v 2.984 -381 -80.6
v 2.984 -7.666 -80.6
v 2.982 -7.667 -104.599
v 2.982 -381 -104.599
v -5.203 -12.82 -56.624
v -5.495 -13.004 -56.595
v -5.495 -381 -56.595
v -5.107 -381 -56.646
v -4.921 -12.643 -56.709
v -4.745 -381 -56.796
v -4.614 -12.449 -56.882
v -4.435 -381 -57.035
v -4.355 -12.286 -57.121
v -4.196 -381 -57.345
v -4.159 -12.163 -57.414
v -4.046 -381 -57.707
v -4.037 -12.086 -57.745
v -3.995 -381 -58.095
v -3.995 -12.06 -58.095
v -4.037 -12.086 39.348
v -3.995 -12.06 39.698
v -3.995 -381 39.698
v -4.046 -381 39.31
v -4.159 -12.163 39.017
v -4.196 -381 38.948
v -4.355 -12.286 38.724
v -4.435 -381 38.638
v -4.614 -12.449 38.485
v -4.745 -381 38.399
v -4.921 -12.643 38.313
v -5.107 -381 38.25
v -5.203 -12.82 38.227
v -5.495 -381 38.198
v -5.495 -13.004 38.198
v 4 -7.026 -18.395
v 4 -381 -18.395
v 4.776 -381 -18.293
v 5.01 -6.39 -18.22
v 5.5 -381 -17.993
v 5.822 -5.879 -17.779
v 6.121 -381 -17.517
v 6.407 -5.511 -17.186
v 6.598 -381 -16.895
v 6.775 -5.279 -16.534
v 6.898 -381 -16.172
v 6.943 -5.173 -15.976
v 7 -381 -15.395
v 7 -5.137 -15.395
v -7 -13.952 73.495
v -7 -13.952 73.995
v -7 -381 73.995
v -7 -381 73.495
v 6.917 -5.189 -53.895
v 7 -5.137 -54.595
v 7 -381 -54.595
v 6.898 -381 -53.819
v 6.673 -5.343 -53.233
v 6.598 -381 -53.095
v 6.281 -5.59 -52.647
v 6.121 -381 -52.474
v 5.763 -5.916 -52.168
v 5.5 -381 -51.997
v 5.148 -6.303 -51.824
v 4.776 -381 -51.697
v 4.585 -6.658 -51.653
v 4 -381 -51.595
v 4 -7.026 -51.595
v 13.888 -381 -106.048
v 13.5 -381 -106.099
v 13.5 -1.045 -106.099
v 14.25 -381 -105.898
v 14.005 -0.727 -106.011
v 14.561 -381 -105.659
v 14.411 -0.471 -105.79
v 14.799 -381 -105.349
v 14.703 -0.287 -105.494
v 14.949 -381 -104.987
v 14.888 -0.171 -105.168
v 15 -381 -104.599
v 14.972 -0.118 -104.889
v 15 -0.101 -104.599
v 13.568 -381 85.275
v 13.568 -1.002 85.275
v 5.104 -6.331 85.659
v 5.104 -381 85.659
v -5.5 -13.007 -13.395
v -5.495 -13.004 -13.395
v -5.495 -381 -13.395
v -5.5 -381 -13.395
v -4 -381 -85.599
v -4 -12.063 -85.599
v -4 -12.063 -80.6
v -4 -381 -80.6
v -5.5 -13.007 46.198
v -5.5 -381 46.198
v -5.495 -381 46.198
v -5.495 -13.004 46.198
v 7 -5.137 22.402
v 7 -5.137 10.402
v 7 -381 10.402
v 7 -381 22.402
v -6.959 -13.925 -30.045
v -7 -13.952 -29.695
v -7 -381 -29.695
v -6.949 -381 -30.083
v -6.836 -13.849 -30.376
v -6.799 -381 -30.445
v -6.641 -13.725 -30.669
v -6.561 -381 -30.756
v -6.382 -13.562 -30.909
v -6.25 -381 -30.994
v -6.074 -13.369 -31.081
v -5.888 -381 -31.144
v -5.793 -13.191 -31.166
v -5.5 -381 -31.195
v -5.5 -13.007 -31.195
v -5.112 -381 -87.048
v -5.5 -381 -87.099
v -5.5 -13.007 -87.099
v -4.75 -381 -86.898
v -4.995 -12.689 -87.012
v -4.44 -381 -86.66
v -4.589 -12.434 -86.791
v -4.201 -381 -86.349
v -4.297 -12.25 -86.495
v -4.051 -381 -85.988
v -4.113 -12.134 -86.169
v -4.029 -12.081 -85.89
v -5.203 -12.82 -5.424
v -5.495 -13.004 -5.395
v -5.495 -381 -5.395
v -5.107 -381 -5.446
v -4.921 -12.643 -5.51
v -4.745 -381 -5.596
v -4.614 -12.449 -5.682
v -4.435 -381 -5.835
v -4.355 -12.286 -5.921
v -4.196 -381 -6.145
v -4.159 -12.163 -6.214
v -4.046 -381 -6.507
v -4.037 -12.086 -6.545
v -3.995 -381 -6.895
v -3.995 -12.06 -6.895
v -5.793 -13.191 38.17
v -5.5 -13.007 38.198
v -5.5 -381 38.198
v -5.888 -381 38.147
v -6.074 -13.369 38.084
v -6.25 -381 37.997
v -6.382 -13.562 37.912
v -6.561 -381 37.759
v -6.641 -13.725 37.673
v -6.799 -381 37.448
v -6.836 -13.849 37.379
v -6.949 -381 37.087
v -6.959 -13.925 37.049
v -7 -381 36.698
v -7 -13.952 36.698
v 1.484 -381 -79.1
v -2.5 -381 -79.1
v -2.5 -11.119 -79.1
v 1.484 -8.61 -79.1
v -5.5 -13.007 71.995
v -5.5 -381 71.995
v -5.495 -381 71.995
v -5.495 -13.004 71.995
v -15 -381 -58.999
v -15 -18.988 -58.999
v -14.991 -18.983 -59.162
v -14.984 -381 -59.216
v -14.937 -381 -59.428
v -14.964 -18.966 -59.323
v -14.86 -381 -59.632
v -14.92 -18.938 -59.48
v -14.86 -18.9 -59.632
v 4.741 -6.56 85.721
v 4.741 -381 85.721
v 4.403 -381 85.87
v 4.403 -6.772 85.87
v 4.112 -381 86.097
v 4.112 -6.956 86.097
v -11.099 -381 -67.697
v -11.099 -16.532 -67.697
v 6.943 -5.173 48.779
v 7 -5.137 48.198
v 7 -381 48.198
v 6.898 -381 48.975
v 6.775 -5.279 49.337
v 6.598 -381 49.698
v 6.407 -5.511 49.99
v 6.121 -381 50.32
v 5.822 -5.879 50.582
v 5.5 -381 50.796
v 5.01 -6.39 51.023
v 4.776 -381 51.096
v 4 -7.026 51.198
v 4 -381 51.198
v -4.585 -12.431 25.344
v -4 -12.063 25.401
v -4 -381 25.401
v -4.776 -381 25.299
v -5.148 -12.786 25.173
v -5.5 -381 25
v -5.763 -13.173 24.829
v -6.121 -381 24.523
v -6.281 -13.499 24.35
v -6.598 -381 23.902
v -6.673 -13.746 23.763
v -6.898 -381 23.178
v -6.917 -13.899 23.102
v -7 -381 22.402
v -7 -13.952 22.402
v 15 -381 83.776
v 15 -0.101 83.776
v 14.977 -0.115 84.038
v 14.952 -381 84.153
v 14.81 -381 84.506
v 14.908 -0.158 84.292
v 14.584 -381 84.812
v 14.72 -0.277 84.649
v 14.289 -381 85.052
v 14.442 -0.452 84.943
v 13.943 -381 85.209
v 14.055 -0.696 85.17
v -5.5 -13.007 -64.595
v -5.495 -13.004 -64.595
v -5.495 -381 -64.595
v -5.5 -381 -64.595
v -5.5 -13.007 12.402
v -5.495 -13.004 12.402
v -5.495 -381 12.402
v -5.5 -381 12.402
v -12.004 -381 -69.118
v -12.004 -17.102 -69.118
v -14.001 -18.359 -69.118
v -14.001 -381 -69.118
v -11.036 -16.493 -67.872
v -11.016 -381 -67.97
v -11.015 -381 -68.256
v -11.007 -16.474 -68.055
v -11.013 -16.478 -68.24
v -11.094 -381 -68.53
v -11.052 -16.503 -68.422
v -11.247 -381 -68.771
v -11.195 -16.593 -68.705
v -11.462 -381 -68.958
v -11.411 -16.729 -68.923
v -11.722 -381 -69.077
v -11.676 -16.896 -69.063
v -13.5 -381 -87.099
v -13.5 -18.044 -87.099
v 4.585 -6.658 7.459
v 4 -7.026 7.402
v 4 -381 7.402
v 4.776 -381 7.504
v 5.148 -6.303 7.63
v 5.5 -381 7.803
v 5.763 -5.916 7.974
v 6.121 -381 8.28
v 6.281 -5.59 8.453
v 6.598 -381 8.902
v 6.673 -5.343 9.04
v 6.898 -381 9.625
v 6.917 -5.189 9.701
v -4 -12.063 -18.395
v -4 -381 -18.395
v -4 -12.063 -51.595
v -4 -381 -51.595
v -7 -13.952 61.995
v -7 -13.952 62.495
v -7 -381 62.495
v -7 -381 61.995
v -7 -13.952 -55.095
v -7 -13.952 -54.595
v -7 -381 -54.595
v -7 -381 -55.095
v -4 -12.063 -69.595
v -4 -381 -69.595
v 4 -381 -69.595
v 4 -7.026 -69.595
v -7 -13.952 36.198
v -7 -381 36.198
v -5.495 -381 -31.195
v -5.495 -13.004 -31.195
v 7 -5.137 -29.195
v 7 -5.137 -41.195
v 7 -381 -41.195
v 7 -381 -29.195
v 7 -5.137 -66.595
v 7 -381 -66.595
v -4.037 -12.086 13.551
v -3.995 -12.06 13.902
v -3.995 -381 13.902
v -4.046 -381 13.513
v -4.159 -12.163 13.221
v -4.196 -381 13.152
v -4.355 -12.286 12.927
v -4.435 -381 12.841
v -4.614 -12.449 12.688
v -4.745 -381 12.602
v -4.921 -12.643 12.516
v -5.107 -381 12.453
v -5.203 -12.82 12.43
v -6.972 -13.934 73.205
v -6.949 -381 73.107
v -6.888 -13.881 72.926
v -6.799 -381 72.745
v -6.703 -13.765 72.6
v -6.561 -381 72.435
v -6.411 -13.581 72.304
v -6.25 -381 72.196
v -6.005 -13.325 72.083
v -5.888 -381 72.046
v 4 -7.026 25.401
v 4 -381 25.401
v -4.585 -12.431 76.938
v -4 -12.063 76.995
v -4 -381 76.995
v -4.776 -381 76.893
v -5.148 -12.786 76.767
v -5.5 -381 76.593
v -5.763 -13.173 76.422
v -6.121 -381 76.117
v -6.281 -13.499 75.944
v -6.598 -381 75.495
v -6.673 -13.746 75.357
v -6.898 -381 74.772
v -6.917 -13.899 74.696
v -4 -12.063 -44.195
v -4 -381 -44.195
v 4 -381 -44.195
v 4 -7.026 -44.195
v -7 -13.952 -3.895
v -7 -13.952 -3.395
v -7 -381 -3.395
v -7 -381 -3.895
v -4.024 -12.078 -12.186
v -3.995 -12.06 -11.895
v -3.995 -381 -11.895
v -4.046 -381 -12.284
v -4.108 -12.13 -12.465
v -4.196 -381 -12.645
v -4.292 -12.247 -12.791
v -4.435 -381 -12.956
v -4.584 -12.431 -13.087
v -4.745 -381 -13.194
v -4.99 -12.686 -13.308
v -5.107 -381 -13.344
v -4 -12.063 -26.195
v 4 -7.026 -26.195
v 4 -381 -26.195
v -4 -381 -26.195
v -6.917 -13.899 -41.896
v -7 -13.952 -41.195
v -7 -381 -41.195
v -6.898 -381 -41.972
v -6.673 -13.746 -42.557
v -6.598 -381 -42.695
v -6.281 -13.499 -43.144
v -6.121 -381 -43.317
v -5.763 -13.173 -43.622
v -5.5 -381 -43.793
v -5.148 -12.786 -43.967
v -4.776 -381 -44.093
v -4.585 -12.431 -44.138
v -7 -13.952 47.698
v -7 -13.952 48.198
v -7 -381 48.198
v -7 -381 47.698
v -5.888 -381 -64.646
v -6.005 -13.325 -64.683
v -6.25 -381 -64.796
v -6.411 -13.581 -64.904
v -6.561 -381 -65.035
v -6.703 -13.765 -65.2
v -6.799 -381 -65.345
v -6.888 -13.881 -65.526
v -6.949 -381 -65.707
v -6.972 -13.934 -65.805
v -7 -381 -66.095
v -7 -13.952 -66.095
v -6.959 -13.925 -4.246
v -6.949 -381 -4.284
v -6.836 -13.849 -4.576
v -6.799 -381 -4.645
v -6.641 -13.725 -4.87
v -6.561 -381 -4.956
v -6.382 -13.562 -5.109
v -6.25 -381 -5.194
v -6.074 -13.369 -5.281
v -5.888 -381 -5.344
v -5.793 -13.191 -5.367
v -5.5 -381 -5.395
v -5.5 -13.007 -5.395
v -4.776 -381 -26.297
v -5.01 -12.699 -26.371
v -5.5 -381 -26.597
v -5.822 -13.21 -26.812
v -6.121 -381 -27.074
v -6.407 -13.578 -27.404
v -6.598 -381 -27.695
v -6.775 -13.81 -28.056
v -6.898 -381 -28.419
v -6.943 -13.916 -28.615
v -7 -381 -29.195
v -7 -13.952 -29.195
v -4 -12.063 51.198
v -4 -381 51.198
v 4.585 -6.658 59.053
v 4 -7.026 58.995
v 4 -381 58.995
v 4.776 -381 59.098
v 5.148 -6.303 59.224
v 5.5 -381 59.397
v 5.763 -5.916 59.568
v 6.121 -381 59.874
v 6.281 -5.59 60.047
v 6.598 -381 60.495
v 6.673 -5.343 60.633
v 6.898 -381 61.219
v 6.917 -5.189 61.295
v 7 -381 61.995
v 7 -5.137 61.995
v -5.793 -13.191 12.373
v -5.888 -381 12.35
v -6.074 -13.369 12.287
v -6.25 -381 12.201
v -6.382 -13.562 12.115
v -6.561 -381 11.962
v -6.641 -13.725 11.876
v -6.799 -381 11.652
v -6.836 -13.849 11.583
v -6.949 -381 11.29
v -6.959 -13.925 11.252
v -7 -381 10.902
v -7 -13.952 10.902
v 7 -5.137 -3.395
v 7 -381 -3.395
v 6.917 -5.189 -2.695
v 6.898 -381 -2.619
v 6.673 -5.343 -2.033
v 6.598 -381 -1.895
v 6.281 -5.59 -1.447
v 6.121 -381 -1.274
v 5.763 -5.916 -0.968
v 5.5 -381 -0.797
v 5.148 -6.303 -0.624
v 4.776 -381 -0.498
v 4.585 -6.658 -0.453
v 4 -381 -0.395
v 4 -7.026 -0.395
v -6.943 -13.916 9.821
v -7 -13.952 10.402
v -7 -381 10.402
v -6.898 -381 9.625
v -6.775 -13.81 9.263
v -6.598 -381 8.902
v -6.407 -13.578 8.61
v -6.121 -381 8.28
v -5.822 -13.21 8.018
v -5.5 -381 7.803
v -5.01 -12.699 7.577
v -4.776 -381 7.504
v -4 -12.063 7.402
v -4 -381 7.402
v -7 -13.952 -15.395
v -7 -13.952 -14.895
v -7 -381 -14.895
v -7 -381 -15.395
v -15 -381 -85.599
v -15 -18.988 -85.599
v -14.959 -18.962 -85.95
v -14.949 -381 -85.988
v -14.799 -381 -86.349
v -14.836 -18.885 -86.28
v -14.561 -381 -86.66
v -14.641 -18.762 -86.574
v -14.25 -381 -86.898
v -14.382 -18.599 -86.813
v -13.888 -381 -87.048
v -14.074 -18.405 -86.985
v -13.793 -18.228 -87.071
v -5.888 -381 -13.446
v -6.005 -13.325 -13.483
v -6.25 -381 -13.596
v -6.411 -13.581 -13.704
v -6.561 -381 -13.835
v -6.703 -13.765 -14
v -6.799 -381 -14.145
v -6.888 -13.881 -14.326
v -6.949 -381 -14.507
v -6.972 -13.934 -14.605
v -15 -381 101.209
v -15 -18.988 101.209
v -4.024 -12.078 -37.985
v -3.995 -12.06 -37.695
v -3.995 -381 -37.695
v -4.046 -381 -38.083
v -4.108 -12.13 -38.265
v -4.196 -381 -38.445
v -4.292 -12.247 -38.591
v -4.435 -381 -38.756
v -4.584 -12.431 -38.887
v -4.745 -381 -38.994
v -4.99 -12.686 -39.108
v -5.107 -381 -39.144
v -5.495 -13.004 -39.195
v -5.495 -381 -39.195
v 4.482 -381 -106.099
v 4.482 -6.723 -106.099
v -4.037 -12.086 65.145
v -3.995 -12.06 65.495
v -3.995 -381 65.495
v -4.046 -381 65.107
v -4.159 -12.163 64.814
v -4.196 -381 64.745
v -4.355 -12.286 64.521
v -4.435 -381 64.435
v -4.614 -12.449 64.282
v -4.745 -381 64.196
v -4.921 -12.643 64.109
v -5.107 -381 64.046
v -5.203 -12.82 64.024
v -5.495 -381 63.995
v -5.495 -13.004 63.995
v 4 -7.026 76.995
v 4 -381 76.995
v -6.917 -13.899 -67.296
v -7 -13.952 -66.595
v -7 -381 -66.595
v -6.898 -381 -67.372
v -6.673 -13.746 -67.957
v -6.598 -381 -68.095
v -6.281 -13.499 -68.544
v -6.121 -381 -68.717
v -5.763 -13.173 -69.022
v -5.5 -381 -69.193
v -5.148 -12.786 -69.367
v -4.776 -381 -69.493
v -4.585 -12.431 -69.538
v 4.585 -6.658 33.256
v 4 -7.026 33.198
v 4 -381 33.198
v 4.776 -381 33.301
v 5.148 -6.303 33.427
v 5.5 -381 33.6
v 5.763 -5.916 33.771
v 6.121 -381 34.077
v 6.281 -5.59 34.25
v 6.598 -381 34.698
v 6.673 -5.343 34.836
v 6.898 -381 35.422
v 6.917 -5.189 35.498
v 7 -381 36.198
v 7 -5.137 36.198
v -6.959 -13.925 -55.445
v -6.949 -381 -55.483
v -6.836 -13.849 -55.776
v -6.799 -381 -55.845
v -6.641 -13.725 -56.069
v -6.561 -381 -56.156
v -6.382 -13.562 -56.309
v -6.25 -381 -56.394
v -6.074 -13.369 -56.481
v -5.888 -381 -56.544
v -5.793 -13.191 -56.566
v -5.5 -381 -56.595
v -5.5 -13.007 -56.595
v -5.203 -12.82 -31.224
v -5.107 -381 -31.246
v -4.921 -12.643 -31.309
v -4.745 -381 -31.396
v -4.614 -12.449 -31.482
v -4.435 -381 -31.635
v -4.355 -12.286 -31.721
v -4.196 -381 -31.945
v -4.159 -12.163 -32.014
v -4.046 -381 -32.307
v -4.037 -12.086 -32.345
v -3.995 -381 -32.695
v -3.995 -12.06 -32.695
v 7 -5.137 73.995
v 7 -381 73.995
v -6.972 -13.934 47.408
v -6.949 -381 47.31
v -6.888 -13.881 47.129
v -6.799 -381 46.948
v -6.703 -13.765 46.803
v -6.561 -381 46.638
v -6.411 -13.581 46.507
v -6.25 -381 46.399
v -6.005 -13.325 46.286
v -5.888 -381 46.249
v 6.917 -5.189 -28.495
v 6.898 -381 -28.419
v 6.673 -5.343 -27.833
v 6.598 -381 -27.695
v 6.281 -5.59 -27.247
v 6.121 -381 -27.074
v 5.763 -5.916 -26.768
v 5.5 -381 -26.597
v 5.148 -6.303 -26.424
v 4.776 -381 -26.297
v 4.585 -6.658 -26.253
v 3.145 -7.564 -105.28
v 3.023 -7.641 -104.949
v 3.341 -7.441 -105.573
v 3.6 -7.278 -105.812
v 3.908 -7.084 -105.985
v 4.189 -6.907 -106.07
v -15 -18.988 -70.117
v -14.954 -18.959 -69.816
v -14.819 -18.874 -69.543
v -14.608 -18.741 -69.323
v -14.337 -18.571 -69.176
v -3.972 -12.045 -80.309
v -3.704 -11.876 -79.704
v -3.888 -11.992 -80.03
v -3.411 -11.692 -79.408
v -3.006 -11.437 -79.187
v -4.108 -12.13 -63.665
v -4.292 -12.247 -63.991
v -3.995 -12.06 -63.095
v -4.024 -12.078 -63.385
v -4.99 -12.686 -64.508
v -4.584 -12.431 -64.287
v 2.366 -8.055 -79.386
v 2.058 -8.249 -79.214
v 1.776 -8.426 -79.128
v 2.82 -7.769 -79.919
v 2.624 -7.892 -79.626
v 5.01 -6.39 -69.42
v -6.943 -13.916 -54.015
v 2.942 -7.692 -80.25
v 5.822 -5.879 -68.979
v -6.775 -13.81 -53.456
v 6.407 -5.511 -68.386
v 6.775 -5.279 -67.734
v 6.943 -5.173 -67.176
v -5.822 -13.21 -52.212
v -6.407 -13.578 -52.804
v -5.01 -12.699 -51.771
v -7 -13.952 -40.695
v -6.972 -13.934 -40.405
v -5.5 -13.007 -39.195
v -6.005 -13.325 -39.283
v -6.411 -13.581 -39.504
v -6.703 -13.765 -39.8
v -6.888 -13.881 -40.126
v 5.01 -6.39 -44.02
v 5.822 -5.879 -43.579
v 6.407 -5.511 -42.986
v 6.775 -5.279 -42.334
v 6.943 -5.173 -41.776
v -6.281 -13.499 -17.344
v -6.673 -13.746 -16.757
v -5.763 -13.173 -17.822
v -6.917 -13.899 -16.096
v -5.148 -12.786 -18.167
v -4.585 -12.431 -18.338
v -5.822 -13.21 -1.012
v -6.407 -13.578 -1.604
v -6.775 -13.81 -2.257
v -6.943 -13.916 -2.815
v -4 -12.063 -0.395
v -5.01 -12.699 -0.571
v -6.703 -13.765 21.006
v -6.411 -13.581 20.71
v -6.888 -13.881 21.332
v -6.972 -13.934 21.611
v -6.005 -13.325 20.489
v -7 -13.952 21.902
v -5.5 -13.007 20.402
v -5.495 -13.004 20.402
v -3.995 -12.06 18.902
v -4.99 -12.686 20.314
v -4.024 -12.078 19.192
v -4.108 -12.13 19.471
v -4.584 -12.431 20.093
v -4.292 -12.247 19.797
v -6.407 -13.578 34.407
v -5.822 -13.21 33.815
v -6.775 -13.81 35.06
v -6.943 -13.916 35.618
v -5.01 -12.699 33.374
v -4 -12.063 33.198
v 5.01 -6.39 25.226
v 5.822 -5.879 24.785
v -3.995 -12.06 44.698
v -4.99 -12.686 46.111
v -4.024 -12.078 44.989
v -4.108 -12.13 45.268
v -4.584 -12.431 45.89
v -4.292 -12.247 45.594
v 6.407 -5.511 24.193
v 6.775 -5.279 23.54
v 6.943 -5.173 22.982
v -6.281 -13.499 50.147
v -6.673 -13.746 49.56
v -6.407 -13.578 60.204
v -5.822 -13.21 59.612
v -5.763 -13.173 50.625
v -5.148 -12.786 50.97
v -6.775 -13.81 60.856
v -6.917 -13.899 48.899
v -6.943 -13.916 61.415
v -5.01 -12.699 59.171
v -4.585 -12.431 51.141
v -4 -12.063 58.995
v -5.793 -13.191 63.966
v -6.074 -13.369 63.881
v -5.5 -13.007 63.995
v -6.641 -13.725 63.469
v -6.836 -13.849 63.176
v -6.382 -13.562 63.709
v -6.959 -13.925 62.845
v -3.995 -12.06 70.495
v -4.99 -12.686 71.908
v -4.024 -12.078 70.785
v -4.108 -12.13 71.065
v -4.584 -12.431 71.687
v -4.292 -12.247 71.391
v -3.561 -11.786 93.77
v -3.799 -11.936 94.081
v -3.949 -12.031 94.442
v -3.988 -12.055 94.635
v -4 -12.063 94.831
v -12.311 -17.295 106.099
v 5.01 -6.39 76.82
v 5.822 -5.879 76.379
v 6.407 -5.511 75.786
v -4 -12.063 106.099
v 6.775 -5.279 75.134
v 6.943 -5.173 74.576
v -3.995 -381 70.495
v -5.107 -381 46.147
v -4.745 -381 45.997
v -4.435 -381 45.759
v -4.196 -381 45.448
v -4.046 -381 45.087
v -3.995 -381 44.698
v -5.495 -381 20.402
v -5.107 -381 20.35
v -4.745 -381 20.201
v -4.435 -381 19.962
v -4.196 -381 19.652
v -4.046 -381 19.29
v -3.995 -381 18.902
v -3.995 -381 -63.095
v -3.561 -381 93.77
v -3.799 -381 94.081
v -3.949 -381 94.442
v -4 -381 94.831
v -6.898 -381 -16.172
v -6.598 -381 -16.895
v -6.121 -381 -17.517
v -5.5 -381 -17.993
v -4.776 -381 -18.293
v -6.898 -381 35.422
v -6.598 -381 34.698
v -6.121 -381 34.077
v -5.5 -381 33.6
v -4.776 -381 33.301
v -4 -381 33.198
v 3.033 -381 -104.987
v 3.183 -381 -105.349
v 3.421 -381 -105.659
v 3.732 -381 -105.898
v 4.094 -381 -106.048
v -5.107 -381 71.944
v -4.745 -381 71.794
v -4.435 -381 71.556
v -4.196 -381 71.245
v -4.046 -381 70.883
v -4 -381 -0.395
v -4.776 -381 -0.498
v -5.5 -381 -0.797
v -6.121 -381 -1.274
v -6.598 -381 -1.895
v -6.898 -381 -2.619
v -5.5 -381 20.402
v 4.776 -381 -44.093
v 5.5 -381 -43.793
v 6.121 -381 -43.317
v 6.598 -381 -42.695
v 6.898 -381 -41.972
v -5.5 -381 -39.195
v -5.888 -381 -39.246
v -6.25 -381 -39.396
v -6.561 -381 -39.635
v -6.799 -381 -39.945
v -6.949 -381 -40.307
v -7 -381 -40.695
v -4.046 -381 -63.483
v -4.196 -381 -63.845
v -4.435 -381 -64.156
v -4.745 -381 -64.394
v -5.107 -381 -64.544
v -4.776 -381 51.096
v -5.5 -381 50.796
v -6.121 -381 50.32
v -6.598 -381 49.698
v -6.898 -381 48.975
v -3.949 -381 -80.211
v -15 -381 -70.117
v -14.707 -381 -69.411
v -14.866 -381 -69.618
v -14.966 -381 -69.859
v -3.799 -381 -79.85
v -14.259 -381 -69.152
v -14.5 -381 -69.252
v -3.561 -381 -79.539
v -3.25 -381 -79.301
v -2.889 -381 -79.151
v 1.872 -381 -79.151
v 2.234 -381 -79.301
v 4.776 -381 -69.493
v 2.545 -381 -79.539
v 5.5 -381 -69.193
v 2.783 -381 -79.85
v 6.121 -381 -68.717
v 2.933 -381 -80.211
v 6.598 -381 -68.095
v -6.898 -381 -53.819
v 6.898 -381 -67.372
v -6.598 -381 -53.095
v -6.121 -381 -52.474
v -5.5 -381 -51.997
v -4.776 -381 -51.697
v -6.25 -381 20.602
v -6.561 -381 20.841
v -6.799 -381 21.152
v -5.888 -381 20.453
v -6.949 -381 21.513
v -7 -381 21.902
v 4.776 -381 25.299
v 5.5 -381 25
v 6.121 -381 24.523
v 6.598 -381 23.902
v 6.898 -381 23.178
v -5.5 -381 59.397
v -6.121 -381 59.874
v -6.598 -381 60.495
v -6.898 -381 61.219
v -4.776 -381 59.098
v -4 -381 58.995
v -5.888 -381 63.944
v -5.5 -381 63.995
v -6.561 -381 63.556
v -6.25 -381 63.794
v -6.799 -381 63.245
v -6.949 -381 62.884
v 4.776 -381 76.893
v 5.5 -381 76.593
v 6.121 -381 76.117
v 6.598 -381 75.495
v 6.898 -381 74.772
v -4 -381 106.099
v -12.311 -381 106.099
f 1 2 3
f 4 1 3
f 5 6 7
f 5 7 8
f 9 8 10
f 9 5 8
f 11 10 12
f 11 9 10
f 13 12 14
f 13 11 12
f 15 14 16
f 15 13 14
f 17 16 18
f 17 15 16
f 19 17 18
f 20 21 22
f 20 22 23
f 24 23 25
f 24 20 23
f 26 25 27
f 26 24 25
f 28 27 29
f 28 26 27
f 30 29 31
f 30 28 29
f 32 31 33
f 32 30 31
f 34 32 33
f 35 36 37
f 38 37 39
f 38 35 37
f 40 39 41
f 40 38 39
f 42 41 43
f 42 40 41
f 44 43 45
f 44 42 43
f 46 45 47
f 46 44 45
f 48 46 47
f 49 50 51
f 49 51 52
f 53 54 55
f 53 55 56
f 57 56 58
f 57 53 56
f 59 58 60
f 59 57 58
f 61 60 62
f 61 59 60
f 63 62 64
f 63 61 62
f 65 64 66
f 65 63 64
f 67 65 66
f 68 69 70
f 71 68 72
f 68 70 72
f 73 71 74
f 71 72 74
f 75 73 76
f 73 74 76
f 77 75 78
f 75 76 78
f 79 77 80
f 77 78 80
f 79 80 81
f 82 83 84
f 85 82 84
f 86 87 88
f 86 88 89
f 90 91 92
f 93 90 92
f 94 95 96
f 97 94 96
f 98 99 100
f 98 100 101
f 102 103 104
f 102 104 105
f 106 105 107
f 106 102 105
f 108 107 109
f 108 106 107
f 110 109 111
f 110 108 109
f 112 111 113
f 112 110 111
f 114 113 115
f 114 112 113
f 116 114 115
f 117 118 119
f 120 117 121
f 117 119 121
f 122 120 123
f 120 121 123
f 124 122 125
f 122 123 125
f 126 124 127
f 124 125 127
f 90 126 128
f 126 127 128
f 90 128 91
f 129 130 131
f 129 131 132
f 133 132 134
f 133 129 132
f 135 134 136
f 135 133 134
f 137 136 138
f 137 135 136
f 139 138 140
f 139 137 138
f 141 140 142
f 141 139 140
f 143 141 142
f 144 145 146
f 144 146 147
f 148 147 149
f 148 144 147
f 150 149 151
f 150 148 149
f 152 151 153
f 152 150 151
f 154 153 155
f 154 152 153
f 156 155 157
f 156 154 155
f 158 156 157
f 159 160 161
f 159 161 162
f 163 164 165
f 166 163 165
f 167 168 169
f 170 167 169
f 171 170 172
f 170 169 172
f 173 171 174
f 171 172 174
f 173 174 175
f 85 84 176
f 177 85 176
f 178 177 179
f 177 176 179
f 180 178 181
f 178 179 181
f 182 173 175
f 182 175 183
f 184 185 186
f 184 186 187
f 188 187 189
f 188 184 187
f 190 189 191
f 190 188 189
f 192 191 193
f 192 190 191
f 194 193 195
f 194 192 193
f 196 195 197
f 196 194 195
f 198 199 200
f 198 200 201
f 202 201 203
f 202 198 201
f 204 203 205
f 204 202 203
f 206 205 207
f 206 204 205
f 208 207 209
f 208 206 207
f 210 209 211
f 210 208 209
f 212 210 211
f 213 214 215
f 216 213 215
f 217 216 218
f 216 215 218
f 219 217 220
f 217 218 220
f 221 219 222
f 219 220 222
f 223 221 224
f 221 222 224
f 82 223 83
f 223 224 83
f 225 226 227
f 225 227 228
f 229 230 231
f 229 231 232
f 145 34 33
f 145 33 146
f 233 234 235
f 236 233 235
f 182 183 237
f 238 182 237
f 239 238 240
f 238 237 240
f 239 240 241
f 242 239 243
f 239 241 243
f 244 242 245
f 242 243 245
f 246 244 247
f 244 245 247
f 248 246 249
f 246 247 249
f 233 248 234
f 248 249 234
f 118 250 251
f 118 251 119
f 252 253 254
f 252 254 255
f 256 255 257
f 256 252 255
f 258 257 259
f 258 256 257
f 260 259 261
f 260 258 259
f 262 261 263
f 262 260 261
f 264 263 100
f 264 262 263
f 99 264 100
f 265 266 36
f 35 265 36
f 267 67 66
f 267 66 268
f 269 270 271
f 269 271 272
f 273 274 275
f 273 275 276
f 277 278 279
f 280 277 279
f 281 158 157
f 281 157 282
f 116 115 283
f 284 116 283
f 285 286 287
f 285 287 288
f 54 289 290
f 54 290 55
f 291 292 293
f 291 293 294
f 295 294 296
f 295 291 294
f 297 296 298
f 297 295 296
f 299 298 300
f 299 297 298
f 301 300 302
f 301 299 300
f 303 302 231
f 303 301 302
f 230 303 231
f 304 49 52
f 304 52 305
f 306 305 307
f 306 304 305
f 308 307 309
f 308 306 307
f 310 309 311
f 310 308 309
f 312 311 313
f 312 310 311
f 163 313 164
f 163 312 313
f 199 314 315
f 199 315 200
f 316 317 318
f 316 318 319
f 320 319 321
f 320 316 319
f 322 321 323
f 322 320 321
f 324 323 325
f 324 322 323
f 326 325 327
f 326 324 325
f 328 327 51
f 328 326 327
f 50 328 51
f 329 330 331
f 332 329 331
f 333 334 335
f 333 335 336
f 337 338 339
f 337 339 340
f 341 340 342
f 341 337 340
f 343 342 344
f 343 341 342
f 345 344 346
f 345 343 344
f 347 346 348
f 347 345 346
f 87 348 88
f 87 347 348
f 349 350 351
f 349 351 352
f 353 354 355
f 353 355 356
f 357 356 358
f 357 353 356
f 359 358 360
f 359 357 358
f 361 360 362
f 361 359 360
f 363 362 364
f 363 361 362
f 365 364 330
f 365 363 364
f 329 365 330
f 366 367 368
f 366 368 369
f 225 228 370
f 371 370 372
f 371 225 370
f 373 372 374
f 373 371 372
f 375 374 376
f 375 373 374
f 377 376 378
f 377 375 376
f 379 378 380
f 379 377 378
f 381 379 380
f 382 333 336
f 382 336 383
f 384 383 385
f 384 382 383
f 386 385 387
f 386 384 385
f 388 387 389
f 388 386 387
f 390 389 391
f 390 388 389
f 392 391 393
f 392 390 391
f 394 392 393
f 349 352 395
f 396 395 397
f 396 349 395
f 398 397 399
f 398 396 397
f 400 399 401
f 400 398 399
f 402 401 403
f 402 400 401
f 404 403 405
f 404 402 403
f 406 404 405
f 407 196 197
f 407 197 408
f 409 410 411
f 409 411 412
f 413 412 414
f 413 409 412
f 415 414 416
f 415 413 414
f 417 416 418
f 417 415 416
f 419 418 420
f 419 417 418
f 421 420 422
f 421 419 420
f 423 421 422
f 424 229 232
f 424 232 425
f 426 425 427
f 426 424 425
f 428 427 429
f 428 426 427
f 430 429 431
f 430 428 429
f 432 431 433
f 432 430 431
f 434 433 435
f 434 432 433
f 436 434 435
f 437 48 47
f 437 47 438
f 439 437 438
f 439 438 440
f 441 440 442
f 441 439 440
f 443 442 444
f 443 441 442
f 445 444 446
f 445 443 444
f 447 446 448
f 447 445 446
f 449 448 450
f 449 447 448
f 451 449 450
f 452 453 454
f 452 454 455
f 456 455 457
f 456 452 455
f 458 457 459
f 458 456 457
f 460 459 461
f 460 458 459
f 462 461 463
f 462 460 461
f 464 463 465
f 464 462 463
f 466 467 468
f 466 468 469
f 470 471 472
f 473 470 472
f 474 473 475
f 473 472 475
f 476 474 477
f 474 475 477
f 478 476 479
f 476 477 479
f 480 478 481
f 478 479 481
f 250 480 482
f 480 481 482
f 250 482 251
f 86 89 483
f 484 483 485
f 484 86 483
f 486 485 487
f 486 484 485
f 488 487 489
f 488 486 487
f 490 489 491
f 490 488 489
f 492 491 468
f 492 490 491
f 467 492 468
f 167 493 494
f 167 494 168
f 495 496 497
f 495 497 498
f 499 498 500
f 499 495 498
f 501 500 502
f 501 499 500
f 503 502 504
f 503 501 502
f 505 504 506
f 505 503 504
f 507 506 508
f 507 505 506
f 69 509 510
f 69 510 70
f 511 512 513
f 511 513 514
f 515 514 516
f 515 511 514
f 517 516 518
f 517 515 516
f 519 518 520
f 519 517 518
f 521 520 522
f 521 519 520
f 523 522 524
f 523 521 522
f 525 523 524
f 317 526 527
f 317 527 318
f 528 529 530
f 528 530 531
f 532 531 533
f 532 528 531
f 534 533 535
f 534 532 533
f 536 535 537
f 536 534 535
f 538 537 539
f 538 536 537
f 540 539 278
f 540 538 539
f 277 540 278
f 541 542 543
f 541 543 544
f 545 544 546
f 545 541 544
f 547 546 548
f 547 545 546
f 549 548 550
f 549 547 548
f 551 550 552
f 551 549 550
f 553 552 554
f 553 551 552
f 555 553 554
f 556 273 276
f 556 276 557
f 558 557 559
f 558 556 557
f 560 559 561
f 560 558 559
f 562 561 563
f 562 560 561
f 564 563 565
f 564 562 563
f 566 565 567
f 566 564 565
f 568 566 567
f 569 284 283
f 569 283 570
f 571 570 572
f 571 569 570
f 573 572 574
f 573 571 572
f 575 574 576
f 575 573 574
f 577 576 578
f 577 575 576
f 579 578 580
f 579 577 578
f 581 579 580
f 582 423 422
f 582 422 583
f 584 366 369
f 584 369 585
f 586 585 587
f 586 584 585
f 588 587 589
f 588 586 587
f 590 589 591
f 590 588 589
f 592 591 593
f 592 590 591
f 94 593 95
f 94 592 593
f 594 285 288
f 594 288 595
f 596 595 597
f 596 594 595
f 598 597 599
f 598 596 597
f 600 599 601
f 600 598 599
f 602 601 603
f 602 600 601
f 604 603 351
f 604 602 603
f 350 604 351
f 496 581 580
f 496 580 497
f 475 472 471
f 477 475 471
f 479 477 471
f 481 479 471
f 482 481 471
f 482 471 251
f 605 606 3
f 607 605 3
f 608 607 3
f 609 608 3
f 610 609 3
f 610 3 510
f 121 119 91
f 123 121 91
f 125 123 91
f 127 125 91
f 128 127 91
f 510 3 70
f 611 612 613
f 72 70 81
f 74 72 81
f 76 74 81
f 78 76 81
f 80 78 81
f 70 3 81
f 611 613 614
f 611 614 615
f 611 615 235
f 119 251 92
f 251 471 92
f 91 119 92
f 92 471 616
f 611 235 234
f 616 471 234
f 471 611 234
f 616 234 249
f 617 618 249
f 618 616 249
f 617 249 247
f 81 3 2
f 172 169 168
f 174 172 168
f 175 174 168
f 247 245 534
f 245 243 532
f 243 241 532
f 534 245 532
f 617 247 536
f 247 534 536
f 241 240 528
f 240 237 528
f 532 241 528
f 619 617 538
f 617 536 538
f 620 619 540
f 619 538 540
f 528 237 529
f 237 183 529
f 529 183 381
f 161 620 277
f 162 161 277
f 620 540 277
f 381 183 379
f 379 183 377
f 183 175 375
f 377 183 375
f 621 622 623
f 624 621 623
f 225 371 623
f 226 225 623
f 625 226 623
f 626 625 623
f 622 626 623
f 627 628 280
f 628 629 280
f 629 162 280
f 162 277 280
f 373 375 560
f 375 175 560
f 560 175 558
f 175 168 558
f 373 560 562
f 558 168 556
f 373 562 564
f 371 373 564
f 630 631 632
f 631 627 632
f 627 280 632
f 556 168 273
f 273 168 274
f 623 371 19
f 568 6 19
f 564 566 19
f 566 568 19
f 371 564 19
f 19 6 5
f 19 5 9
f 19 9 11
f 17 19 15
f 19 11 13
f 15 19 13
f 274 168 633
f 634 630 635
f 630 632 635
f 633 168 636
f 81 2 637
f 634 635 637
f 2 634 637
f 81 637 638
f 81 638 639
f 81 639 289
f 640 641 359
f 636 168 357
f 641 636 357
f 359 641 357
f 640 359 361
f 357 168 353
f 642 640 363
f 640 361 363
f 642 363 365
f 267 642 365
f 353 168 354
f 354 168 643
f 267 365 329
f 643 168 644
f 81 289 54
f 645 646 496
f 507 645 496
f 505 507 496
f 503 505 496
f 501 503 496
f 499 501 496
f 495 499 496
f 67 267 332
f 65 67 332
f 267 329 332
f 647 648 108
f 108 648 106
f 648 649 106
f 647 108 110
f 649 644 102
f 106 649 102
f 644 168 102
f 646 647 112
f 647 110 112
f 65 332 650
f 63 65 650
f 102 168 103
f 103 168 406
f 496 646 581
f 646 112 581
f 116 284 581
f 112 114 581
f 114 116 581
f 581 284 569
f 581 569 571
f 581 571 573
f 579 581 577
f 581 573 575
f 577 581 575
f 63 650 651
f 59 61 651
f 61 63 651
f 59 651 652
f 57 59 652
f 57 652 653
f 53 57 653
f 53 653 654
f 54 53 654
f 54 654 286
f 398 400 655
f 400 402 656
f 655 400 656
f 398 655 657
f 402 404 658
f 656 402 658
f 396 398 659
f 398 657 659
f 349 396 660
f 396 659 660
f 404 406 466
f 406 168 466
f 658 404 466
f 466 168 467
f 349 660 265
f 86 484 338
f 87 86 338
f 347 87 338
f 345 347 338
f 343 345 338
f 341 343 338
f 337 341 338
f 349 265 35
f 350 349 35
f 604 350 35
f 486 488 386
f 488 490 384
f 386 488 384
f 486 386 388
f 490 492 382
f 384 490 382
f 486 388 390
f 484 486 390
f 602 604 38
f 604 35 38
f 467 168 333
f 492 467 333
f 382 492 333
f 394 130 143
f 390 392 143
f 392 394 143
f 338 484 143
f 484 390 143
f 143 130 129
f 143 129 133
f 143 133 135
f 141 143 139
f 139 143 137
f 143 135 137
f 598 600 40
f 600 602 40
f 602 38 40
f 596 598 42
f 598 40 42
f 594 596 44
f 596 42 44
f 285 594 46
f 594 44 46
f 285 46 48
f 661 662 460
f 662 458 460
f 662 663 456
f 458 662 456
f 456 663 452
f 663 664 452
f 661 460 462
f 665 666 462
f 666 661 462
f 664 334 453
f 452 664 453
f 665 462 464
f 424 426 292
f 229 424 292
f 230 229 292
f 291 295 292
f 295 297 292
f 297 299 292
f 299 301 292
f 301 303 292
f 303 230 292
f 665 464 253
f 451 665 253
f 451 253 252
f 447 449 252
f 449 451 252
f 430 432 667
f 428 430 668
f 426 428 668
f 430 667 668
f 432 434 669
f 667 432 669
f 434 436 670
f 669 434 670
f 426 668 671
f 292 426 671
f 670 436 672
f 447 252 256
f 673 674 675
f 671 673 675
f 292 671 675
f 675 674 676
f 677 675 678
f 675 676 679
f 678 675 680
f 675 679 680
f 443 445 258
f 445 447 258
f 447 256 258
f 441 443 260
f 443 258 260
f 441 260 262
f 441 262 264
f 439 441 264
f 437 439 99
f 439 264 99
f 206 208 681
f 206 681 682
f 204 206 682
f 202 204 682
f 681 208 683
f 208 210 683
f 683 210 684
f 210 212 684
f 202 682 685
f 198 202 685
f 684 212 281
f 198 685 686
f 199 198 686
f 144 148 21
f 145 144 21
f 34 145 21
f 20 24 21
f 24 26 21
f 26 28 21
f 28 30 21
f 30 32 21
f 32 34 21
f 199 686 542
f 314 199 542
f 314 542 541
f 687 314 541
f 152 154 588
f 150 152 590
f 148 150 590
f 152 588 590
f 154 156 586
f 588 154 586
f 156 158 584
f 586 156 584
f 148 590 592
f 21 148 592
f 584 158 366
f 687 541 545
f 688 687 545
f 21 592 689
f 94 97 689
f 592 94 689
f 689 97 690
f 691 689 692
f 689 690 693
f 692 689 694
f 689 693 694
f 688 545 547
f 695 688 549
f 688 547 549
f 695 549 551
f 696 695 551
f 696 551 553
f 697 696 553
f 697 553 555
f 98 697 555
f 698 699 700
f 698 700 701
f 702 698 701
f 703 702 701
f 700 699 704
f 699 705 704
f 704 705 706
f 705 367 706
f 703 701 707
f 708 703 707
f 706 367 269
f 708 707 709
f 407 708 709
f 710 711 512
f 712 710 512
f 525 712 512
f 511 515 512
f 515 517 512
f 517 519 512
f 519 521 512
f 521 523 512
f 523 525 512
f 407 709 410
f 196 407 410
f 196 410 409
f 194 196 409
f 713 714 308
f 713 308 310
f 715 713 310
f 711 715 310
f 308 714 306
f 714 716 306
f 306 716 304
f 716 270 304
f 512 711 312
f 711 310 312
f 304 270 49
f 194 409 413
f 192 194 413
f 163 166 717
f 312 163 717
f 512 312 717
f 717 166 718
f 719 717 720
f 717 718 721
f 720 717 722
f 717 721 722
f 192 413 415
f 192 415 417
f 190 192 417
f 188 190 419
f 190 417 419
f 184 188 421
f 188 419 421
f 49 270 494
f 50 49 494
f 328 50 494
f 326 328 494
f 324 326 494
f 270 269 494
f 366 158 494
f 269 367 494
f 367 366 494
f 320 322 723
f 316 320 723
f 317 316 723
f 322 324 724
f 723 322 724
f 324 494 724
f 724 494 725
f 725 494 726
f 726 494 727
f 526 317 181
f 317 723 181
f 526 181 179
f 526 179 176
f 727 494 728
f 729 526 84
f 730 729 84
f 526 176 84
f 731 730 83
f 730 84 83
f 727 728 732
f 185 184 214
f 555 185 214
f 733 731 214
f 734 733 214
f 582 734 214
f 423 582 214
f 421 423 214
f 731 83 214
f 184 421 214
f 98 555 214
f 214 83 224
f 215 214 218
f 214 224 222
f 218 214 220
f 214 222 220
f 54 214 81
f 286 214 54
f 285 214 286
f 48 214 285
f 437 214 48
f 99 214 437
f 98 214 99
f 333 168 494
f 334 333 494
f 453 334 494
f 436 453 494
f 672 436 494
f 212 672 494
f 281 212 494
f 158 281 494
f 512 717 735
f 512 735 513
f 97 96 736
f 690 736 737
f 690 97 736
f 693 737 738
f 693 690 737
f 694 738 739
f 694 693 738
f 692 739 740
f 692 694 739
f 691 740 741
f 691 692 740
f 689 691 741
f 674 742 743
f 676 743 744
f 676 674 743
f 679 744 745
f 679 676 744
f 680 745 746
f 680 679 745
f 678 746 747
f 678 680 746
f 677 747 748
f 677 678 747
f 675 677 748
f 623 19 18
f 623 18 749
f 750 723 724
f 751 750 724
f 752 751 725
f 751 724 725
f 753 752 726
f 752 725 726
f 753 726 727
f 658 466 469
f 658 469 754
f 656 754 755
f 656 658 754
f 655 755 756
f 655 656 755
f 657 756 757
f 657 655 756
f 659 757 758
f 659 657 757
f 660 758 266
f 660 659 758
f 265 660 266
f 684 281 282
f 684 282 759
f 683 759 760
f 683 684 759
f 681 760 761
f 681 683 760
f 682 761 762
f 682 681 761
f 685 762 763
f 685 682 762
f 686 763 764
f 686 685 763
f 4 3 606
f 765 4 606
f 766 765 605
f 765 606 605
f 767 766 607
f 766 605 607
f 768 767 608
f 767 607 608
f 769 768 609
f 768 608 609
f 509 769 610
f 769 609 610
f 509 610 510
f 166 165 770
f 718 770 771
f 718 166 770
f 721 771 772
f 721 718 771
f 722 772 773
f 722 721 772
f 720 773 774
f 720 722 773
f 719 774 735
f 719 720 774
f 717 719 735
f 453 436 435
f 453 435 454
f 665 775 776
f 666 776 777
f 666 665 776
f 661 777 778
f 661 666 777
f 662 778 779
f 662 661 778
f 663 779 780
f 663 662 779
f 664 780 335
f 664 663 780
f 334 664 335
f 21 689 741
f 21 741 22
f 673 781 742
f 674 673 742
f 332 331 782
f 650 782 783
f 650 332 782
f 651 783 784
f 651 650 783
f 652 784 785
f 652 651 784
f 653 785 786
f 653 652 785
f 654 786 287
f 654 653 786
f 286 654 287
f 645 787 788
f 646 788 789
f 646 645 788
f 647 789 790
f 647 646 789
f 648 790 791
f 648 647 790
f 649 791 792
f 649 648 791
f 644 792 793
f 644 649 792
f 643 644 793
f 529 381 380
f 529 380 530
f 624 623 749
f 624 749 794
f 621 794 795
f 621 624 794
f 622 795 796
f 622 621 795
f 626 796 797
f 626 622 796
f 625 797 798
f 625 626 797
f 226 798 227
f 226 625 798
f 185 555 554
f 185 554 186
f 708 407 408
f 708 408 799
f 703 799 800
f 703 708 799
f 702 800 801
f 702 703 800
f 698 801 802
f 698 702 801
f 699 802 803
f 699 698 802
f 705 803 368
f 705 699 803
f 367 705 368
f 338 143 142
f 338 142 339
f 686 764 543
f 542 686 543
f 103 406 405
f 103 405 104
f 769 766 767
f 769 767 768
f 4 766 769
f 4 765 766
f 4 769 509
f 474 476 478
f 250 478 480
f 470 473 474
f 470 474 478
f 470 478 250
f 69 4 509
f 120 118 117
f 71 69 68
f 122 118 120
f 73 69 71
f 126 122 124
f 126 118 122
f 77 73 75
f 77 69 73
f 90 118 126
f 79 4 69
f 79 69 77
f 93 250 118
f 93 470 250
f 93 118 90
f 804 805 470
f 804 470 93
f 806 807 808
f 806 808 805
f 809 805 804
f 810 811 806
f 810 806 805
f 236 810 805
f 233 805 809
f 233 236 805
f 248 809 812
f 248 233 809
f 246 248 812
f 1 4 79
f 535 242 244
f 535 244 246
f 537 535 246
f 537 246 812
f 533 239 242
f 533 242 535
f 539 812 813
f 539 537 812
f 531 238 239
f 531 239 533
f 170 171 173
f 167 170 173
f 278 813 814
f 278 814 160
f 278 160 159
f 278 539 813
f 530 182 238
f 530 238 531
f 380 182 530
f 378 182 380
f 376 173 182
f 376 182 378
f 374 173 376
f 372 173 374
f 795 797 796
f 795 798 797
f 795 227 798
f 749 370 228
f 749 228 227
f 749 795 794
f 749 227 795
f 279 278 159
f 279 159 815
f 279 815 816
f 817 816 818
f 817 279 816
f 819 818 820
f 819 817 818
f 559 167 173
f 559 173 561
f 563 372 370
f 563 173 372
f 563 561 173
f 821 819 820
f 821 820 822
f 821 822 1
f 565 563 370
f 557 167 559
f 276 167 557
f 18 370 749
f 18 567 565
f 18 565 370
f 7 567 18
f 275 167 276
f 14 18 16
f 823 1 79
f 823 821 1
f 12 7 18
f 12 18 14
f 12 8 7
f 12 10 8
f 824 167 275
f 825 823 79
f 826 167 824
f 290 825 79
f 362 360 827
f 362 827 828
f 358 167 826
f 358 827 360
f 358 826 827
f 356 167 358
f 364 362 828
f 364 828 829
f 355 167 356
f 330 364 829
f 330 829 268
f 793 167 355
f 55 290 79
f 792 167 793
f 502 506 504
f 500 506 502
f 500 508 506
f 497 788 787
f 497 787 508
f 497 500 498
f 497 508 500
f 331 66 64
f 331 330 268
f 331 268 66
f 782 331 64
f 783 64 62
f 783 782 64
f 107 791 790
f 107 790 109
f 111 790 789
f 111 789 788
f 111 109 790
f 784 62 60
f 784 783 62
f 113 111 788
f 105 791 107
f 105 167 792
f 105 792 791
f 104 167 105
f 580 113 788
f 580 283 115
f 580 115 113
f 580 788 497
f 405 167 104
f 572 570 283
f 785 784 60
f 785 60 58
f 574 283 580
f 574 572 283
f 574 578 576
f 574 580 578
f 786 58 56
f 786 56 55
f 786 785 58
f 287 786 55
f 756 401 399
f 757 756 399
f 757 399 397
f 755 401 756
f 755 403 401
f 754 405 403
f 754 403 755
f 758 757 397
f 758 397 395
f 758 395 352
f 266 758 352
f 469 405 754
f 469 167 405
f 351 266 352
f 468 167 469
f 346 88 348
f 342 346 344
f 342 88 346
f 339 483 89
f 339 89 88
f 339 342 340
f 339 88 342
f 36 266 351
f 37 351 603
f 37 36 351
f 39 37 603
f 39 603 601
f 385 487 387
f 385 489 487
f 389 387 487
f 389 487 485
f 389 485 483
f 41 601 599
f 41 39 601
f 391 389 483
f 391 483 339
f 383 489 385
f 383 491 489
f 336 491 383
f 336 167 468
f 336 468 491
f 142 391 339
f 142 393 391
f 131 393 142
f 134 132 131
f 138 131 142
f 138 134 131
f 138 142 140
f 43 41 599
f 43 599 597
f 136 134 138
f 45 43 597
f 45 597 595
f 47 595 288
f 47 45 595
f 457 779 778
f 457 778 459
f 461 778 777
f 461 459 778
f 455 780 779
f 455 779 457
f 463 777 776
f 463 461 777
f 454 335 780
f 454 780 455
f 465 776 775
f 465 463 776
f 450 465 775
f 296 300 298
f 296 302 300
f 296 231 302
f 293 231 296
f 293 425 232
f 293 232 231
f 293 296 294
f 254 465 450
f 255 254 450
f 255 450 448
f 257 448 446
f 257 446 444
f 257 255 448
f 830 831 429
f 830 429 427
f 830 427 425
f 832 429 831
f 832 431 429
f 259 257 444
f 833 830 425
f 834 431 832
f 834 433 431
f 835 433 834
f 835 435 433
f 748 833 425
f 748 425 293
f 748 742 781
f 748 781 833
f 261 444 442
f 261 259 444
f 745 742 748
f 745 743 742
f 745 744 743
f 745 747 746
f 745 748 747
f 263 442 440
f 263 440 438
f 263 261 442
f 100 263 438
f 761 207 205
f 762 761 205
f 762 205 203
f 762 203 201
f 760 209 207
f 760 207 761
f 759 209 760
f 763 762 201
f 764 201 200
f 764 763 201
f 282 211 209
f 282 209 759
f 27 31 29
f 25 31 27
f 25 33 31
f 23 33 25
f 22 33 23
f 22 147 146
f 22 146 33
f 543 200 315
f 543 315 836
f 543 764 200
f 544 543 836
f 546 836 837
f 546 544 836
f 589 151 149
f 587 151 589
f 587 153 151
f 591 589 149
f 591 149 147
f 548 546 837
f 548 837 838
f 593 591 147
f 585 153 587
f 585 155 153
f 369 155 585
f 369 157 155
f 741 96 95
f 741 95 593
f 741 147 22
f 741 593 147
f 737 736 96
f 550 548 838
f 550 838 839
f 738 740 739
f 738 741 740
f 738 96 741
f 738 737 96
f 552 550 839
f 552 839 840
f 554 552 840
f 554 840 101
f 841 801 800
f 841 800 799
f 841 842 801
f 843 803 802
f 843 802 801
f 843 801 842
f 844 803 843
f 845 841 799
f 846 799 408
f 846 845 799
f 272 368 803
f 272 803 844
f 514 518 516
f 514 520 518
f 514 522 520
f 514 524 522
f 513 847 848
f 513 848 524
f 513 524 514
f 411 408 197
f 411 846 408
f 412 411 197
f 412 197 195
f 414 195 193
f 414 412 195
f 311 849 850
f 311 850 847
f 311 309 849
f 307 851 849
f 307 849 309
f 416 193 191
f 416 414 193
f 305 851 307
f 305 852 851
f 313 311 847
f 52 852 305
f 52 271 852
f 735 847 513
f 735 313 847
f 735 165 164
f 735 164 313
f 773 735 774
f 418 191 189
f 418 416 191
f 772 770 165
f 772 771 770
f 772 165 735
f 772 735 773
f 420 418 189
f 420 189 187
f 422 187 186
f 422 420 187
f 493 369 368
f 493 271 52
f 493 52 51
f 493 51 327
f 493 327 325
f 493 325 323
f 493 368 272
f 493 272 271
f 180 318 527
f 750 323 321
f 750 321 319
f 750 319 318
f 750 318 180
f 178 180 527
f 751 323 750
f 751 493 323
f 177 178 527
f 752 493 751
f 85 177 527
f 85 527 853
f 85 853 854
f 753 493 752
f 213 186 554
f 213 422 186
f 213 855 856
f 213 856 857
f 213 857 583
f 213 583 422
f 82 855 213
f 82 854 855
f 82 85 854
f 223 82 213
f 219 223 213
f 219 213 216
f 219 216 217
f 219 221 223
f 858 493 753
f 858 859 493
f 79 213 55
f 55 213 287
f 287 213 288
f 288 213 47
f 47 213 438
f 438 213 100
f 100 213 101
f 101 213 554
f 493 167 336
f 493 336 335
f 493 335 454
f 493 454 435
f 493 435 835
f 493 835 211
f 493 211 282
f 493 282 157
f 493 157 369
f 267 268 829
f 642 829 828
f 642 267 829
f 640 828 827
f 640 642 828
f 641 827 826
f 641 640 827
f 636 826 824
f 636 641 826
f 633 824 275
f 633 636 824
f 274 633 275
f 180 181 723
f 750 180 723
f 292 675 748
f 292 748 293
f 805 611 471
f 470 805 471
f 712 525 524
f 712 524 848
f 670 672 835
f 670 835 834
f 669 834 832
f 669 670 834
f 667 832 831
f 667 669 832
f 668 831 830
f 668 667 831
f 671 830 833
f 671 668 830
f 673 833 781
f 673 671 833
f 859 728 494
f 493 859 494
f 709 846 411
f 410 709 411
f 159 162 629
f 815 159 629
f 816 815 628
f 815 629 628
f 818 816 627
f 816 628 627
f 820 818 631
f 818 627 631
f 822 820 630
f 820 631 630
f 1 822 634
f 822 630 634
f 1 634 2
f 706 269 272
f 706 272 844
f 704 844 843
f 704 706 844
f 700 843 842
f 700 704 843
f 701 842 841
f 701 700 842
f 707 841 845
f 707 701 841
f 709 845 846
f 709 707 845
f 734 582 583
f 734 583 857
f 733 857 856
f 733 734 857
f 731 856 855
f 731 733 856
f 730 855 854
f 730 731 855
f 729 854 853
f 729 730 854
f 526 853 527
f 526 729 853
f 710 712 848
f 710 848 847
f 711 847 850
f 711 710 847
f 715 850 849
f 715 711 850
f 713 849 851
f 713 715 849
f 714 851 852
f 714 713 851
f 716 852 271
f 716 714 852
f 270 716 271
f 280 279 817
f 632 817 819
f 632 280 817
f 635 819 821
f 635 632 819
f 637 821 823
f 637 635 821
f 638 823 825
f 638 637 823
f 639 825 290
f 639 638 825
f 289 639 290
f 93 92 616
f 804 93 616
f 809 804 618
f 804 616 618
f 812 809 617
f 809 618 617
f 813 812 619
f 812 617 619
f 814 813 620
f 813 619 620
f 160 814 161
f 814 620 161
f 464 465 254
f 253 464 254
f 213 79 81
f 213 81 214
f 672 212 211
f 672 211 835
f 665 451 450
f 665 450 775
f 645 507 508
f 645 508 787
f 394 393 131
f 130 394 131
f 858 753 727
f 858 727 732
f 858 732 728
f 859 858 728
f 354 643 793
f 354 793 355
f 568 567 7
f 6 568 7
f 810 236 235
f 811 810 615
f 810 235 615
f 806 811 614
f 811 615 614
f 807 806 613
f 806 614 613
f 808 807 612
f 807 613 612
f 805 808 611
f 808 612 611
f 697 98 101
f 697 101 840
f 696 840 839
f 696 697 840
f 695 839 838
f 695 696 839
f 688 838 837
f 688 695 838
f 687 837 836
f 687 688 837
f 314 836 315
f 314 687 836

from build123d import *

# Parameters (mm, degrees)
F1_DEPTH      = 381
F3_DEPTH      = 711.2
F5_DEPTH      = 106.0997464
F5_DEPTH_BACK = 106.0997464


# Not quite as in the source:
# - ends of sketch curves that miss each other by under 0.0002 mm in the source are joined


with BuildPart() as f1:
    # F0 (on Front) → F1 (new body)
    with BuildSketch(Plane.XZ):
        with BuildLine():
            ThreePointArc((-14.9999680608, -58.9985104), (-14.96444377, -59.322873513), (-14.8595551032, -59.6318585804))
            Line((-14.8595551032, -59.6318585804), (-11.0988328608, -67.6967912))
            ThreePointArc((-11.0988328608, -67.6967912), (-11.1617050028, -68.655791158), (-12.004294, -69.1180454046))
            Line((-12.004294, -69.1180454046), (-14.0009118, -69.1180736))
            ThreePointArc((-14.0009118, -69.1180736), (-14.707352628, -69.410690972), (-14.99997, -70.1171318))
            Line((-14.99997, -70.1171318), (-14.99997, -85.599397))
            ThreePointArc((-14.99997, -85.599397), (-14.5606310505, -86.6600550505), (-13.499973, -87.099394))
            Line((-13.499973, -87.099394), (-5.5003446, -87.099394))
            ThreePointArc((-5.5003446, -87.099394), (-4.4396865495, -86.6600550505), (-4.0003476, -85.599397))
            Line((-4.0003476, -85.599397), (-4.0003476, -80.5996356))
            ThreePointArc((-4.0003476, -80.5996356), (-3.5610086505, -79.5389775495), (-2.5003506, -79.0996386))
            Line((-2.5003506, -79.0996386), (1.4838426, -79.0996386))
            ThreePointArc((1.4838426, -79.0996386), (2.5445365709, -79.5390134712), (2.9838395966, -80.5997372))
            Line((2.9838395966, -80.5997372), (2.98196, -104.5986224))
            ThreePointArc((2.98196, -104.5986224), (3.4212540492, -105.6593625482), (4.481957, -106.0987464))
            Line((4.481957, -106.0987464), (13.499973, -106.0987464))
            ThreePointArc((13.499973, -106.0987464), (14.5606310505, -105.6594074505), (14.99997, -104.5987494))
            Line((14.99997, -104.5987494), (14.99997, 83.7761342))
            ThreePointArc((14.99997, 83.7761342), (14.5844487053, 84.8124273268), (13.5680958768, 85.2745834897))
            Line((13.5680958768, 85.2745834897), (5.104384, 85.6592902))
            ThreePointArc((5.104384, 85.6592902), (4.5671403109, 85.7853117853), (4.1118233495, 86.0970797495))
            Line((4.1118233495, 86.0970797495), (-3.5610038, 93.7699166))
            ThreePointArc((-3.5610038, 93.7699166), (-3.8861671271, 94.2565457995), (-4.0003476, 94.8305698))
            Line((-4.0003476, 94.8305698), (-4.0003476, 106.0987464))
            Line((-4.0003476, 106.0987464), (-12.3105164, 106.0987464))
            Line((-12.3105164, 106.0987464), (-14.99997, 101.2086876))
            Line((-14.99997, 101.2086876), (-14.9999680608, -58.9985104))
        make_face()
    extrude(amount=F1_DEPTH)

    # F2 (on Front) → F3 (cut)
    with BuildSketch(Plane.XZ):
        with BuildLine():
            ThreePointArc((-5.49529, -31.195264), (-4.4346319495, -31.6346029495), (-3.995293, -32.695261))
            Line((-3.995293, -32.695261), (-3.995293, -37.695251))
            ThreePointArc((-3.995293, -37.695251), (-4.4346319495, -38.7559090505), (-5.49529, -39.195248))
            Line((-5.49529, -39.195248), (-5.499989, -39.195248))
            ThreePointArc((-5.499989, -39.195248), (-6.5606470505, -39.6345869495), (-6.999986, -40.695245))
            Line((-6.999986, -40.695245), (-6.999986, -41.195244))
            ThreePointArc((-6.999986, -41.195244), (-6.1213081009, -43.3165601009), (-3.999992, -44.195238))
            Line((-3.999992, -44.195238), (3.999992, -44.195238))
            ThreePointArc((3.999992, -44.195238), (6.1213081009, -43.3165601009), (6.999986, -41.195244))
            Line((6.999986, -41.195244), (6.999986, -29.195268))
            ThreePointArc((6.999986, -29.195268), (6.1213081009, -27.0739518991), (3.999992, -26.195274))
            Line((3.999992, -26.195274), (-3.999992, -26.195274))
            ThreePointArc((-3.999992, -26.195274), (-6.1213081009, -27.0739518991), (-6.999986, -29.195268))
            Line((-6.999986, -29.195268), (-6.999986, -29.695267))
            ThreePointArc((-6.999986, -29.695267), (-6.5606470505, -30.7559250505), (-5.499989, -31.195264))
            Line((-5.499989, -31.195264), (-5.49529, -31.195264))
        make_face()
        with BuildLine():
            ThreePointArc((-5.49529, -56.595264), (-4.4346319495, -57.0346029495), (-3.995293, -58.095261))
            Line((-3.995293, -58.095261), (-3.995293, -63.095251))
            ThreePointArc((-3.995293, -63.095251), (-4.4346319495, -64.1559090505), (-5.49529, -64.595248))
            Line((-5.49529, -64.595248), (-5.499989, -64.595248))
            ThreePointArc((-5.499989, -64.595248), (-6.5606470505, -65.0345869495), (-6.999986, -66.095245))
            Line((-6.999986, -66.095245), (-6.999986, -66.595244))
            ThreePointArc((-6.999986, -66.595244), (-6.1213081009, -68.7165601009), (-3.999992, -69.595238))
            Line((-3.999992, -69.595238), (0, -69.595238))
            Line((0, -69.595238), (3.999992, -69.595238))
            ThreePointArc((3.999992, -69.595238), (6.1213081009, -68.7165601009), (6.999986, -66.595244))
            Line((6.999986, -66.595244), (6.999986, -54.595268))
            ThreePointArc((6.999986, -54.595268), (6.1213081009, -52.4739518991), (3.999992, -51.595274))
            Line((3.999992, -51.595274), (-3.999992, -51.595274))
            ThreePointArc((-3.999992, -51.595274), (-6.1213081009, -52.4739518991), (-6.999986, -54.595268))
            Line((-6.999986, -54.595268), (-6.999986, -55.095267))
            ThreePointArc((-6.999986, -55.095267), (-6.5606470505, -56.1559250505), (-5.499989, -56.595264))
            Line((-5.499989, -56.595264), (-5.49529, -56.595264))
        make_face()
        with BuildLine():
            ThreePointArc((-5.49529, -5.3953664), (-4.4346319495, -5.8347053495), (-3.995293, -6.8953634))
            Line((-3.995293, -6.8953634), (-3.995293, -11.8953534))
            ThreePointArc((-3.995293, -11.8953534), (-4.4346319495, -12.9560114505), (-5.49529, -13.3953504))
            Line((-5.49529, -13.3953504), (-5.499989, -13.3953504))
            ThreePointArc((-5.499989, -13.3953504), (-6.5606470505, -13.8346893495), (-6.999986, -14.8953474))
            Line((-6.999986, -14.8953474), (-6.999986, -15.3953464))
            ThreePointArc((-6.999986, -15.3953464), (-6.1213081009, -17.5166625009), (-3.999992, -18.3953404))
            Line((-3.999992, -18.3953404), (3.999992, -18.3953404))
            ThreePointArc((3.999992, -18.3953404), (6.1213081009, -17.5166625009), (6.999986, -15.3953464))
            Line((6.999986, -15.3953464), (6.999986, -3.3953704))
            ThreePointArc((6.999986, -3.3953704), (6.1213081009, -1.2740542991), (3.999992, -0.3953764))
            Line((3.999992, -0.3953764), (-3.999992, -0.3953764))
            ThreePointArc((-3.999992, -0.3953764), (-6.1213081009, -1.2740542991), (-6.999986, -3.3953704))
            Line((-6.999986, -3.3953704), (-6.999986, -3.8953694))
            ThreePointArc((-6.999986, -3.8953694), (-6.5606470505, -4.9560274505), (-5.499989, -5.3953664))
            Line((-5.499989, -5.3953664), (-5.49529, -5.3953664))
        make_face()
        with BuildLine():
            Line((-5.499989, 20.4015086), (-5.49529, 20.4015086))
            ThreePointArc((-5.49529, 20.4015086), (-4.4346319495, 19.9621696505), (-3.995293, 18.9015116))
            Line((-3.995293, 18.9015116), (-3.995293, 13.9015216))
            ThreePointArc((-3.995293, 13.9015216), (-4.4346319495, 12.8408635495), (-5.49529, 12.4015246))
            Line((-5.49529, 12.4015246), (-5.499989, 12.4015246))
            ThreePointArc((-5.499989, 12.4015246), (-6.5606470505, 11.9621856505), (-6.999986, 10.9015276))
            Line((-6.999986, 10.9015276), (-6.999986, 10.4015286))
            ThreePointArc((-6.999986, 10.4015286), (-6.1213081009, 8.2802124991), (-3.999992, 7.4015346))
            Line((-3.999992, 7.4015346), (3.999992, 7.4015346))
            ThreePointArc((3.999992, 7.4015346), (6.1213081009, 8.2802124991), (6.999986, 10.4015286))
            Line((6.999986, 10.4015286), (6.999986, 22.4015046))
            ThreePointArc((6.999986, 22.4015046), (6.1213081009, 24.5228207009), (3.999992, 25.4014986))
            Line((3.999992, 25.4014986), (-3.999992, 25.4014986))
            ThreePointArc((-3.999992, 25.4014986), (-6.1213081009, 24.5228207009), (-6.999986, 22.4015046))
            Line((-6.999986, 22.4015046), (-6.999986, 21.9015056))
            ThreePointArc((-6.999986, 21.9015056), (-6.5606470505, 20.8408475495), (-5.499989, 20.4015086))
        make_face()
        with BuildLine():
            Line((-5.499989, 46.1983836), (-5.49529, 46.1983836))
            ThreePointArc((-5.49529, 46.1983836), (-4.4346319495, 45.7590446505), (-3.995293, 44.6983866))
            Line((-3.995293, 44.6983866), (-3.995293, 39.6983966))
            ThreePointArc((-3.995293, 39.6983966), (-4.4346319495, 38.6377385495), (-5.49529, 38.1983996))
            Line((-5.49529, 38.1983996), (-5.499989, 38.1983996))
            ThreePointArc((-5.499989, 38.1983996), (-6.5606470505, 37.7590606505), (-6.999986, 36.6984026))
            Line((-6.999986, 36.6984026), (-6.999986, 36.1984036))
            ThreePointArc((-6.999986, 36.1984036), (-6.1213081009, 34.0770874991), (-3.999992, 33.1984096))
            Line((-3.999992, 33.1984096), (3.999992, 33.1984096))
            ThreePointArc((3.999992, 33.1984096), (6.1213081009, 34.0770874991), (6.999986, 36.1984036))
            Line((6.999986, 36.1984036), (6.999986, 48.1983796))
            ThreePointArc((6.999986, 48.1983796), (6.1213081009, 50.3196957009), (3.999992, 51.1983736))
            Line((3.999992, 51.1983736), (-3.999992, 51.1983736))
            ThreePointArc((-3.999992, 51.1983736), (-6.1213081009, 50.3196957009), (-6.999986, 48.1983796))
            Line((-6.999986, 48.1983796), (-6.999986, 47.6983806))
            ThreePointArc((-6.999986, 47.6983806), (-6.5606470505, 46.6377225495), (-5.499989, 46.1983836))
        make_face()
        with BuildLine():
            Line((-5.499989, 71.9952586), (-5.49529, 71.9952586))
            ThreePointArc((-5.49529, 71.9952586), (-4.4346319495, 71.5559196505), (-3.995293, 70.4952616))
            Line((-3.995293, 70.4952616), (-3.995293, 65.4952716))
            ThreePointArc((-3.995293, 65.4952716), (-4.4346319495, 64.4346135495), (-5.49529, 63.9952746))
            Line((-5.49529, 63.9952746), (-5.499989, 63.9952746))
            ThreePointArc((-5.499989, 63.9952746), (-6.5606470505, 63.5559356505), (-6.999986, 62.4952776))
            Line((-6.999986, 62.4952776), (-6.999986, 61.9952786))
            ThreePointArc((-6.999986, 61.9952786), (-6.1213081009, 59.8739624991), (-3.999992, 58.9952846))
            Line((-3.999992, 58.9952846), (3.999992, 58.9952846))
            ThreePointArc((3.999992, 58.9952846), (6.1213081009, 59.8739624991), (6.999986, 61.9952786))
            Line((6.999986, 61.9952786), (6.999986, 73.9952546))
            ThreePointArc((6.999986, 73.9952546), (6.1213081009, 76.1165707009), (3.999992, 76.9952486))
            Line((3.999992, 76.9952486), (-3.999992, 76.9952486))
            ThreePointArc((-3.999992, 76.9952486), (-6.1213081009, 76.1165707009), (-6.999986, 73.9952546))
            Line((-6.999986, 73.9952546), (-6.999986, 73.4952556))
            ThreePointArc((-6.999986, 73.4952556), (-6.5606470505, 72.4345975495), (-5.499989, 71.9952586))
        make_face()
    extrude(amount=F3_DEPTH, mode=Mode.SUBTRACT)

    # F4 (on Top) → F5 (cut, two sides)
    with BuildSketch(Plane.XY) as f5_sk:
        Polygon((15.1597065851, 0), (-15.0980791077, 0), (-15.0980791077, -19.05), align=None)
    extrude(amount=-F5_DEPTH, mode=Mode.SUBTRACT)
    extrude(f5_sk.sketch, amount=F5_DEPTH_BACK, mode=Mode.SUBTRACT)


solid = f1.part
